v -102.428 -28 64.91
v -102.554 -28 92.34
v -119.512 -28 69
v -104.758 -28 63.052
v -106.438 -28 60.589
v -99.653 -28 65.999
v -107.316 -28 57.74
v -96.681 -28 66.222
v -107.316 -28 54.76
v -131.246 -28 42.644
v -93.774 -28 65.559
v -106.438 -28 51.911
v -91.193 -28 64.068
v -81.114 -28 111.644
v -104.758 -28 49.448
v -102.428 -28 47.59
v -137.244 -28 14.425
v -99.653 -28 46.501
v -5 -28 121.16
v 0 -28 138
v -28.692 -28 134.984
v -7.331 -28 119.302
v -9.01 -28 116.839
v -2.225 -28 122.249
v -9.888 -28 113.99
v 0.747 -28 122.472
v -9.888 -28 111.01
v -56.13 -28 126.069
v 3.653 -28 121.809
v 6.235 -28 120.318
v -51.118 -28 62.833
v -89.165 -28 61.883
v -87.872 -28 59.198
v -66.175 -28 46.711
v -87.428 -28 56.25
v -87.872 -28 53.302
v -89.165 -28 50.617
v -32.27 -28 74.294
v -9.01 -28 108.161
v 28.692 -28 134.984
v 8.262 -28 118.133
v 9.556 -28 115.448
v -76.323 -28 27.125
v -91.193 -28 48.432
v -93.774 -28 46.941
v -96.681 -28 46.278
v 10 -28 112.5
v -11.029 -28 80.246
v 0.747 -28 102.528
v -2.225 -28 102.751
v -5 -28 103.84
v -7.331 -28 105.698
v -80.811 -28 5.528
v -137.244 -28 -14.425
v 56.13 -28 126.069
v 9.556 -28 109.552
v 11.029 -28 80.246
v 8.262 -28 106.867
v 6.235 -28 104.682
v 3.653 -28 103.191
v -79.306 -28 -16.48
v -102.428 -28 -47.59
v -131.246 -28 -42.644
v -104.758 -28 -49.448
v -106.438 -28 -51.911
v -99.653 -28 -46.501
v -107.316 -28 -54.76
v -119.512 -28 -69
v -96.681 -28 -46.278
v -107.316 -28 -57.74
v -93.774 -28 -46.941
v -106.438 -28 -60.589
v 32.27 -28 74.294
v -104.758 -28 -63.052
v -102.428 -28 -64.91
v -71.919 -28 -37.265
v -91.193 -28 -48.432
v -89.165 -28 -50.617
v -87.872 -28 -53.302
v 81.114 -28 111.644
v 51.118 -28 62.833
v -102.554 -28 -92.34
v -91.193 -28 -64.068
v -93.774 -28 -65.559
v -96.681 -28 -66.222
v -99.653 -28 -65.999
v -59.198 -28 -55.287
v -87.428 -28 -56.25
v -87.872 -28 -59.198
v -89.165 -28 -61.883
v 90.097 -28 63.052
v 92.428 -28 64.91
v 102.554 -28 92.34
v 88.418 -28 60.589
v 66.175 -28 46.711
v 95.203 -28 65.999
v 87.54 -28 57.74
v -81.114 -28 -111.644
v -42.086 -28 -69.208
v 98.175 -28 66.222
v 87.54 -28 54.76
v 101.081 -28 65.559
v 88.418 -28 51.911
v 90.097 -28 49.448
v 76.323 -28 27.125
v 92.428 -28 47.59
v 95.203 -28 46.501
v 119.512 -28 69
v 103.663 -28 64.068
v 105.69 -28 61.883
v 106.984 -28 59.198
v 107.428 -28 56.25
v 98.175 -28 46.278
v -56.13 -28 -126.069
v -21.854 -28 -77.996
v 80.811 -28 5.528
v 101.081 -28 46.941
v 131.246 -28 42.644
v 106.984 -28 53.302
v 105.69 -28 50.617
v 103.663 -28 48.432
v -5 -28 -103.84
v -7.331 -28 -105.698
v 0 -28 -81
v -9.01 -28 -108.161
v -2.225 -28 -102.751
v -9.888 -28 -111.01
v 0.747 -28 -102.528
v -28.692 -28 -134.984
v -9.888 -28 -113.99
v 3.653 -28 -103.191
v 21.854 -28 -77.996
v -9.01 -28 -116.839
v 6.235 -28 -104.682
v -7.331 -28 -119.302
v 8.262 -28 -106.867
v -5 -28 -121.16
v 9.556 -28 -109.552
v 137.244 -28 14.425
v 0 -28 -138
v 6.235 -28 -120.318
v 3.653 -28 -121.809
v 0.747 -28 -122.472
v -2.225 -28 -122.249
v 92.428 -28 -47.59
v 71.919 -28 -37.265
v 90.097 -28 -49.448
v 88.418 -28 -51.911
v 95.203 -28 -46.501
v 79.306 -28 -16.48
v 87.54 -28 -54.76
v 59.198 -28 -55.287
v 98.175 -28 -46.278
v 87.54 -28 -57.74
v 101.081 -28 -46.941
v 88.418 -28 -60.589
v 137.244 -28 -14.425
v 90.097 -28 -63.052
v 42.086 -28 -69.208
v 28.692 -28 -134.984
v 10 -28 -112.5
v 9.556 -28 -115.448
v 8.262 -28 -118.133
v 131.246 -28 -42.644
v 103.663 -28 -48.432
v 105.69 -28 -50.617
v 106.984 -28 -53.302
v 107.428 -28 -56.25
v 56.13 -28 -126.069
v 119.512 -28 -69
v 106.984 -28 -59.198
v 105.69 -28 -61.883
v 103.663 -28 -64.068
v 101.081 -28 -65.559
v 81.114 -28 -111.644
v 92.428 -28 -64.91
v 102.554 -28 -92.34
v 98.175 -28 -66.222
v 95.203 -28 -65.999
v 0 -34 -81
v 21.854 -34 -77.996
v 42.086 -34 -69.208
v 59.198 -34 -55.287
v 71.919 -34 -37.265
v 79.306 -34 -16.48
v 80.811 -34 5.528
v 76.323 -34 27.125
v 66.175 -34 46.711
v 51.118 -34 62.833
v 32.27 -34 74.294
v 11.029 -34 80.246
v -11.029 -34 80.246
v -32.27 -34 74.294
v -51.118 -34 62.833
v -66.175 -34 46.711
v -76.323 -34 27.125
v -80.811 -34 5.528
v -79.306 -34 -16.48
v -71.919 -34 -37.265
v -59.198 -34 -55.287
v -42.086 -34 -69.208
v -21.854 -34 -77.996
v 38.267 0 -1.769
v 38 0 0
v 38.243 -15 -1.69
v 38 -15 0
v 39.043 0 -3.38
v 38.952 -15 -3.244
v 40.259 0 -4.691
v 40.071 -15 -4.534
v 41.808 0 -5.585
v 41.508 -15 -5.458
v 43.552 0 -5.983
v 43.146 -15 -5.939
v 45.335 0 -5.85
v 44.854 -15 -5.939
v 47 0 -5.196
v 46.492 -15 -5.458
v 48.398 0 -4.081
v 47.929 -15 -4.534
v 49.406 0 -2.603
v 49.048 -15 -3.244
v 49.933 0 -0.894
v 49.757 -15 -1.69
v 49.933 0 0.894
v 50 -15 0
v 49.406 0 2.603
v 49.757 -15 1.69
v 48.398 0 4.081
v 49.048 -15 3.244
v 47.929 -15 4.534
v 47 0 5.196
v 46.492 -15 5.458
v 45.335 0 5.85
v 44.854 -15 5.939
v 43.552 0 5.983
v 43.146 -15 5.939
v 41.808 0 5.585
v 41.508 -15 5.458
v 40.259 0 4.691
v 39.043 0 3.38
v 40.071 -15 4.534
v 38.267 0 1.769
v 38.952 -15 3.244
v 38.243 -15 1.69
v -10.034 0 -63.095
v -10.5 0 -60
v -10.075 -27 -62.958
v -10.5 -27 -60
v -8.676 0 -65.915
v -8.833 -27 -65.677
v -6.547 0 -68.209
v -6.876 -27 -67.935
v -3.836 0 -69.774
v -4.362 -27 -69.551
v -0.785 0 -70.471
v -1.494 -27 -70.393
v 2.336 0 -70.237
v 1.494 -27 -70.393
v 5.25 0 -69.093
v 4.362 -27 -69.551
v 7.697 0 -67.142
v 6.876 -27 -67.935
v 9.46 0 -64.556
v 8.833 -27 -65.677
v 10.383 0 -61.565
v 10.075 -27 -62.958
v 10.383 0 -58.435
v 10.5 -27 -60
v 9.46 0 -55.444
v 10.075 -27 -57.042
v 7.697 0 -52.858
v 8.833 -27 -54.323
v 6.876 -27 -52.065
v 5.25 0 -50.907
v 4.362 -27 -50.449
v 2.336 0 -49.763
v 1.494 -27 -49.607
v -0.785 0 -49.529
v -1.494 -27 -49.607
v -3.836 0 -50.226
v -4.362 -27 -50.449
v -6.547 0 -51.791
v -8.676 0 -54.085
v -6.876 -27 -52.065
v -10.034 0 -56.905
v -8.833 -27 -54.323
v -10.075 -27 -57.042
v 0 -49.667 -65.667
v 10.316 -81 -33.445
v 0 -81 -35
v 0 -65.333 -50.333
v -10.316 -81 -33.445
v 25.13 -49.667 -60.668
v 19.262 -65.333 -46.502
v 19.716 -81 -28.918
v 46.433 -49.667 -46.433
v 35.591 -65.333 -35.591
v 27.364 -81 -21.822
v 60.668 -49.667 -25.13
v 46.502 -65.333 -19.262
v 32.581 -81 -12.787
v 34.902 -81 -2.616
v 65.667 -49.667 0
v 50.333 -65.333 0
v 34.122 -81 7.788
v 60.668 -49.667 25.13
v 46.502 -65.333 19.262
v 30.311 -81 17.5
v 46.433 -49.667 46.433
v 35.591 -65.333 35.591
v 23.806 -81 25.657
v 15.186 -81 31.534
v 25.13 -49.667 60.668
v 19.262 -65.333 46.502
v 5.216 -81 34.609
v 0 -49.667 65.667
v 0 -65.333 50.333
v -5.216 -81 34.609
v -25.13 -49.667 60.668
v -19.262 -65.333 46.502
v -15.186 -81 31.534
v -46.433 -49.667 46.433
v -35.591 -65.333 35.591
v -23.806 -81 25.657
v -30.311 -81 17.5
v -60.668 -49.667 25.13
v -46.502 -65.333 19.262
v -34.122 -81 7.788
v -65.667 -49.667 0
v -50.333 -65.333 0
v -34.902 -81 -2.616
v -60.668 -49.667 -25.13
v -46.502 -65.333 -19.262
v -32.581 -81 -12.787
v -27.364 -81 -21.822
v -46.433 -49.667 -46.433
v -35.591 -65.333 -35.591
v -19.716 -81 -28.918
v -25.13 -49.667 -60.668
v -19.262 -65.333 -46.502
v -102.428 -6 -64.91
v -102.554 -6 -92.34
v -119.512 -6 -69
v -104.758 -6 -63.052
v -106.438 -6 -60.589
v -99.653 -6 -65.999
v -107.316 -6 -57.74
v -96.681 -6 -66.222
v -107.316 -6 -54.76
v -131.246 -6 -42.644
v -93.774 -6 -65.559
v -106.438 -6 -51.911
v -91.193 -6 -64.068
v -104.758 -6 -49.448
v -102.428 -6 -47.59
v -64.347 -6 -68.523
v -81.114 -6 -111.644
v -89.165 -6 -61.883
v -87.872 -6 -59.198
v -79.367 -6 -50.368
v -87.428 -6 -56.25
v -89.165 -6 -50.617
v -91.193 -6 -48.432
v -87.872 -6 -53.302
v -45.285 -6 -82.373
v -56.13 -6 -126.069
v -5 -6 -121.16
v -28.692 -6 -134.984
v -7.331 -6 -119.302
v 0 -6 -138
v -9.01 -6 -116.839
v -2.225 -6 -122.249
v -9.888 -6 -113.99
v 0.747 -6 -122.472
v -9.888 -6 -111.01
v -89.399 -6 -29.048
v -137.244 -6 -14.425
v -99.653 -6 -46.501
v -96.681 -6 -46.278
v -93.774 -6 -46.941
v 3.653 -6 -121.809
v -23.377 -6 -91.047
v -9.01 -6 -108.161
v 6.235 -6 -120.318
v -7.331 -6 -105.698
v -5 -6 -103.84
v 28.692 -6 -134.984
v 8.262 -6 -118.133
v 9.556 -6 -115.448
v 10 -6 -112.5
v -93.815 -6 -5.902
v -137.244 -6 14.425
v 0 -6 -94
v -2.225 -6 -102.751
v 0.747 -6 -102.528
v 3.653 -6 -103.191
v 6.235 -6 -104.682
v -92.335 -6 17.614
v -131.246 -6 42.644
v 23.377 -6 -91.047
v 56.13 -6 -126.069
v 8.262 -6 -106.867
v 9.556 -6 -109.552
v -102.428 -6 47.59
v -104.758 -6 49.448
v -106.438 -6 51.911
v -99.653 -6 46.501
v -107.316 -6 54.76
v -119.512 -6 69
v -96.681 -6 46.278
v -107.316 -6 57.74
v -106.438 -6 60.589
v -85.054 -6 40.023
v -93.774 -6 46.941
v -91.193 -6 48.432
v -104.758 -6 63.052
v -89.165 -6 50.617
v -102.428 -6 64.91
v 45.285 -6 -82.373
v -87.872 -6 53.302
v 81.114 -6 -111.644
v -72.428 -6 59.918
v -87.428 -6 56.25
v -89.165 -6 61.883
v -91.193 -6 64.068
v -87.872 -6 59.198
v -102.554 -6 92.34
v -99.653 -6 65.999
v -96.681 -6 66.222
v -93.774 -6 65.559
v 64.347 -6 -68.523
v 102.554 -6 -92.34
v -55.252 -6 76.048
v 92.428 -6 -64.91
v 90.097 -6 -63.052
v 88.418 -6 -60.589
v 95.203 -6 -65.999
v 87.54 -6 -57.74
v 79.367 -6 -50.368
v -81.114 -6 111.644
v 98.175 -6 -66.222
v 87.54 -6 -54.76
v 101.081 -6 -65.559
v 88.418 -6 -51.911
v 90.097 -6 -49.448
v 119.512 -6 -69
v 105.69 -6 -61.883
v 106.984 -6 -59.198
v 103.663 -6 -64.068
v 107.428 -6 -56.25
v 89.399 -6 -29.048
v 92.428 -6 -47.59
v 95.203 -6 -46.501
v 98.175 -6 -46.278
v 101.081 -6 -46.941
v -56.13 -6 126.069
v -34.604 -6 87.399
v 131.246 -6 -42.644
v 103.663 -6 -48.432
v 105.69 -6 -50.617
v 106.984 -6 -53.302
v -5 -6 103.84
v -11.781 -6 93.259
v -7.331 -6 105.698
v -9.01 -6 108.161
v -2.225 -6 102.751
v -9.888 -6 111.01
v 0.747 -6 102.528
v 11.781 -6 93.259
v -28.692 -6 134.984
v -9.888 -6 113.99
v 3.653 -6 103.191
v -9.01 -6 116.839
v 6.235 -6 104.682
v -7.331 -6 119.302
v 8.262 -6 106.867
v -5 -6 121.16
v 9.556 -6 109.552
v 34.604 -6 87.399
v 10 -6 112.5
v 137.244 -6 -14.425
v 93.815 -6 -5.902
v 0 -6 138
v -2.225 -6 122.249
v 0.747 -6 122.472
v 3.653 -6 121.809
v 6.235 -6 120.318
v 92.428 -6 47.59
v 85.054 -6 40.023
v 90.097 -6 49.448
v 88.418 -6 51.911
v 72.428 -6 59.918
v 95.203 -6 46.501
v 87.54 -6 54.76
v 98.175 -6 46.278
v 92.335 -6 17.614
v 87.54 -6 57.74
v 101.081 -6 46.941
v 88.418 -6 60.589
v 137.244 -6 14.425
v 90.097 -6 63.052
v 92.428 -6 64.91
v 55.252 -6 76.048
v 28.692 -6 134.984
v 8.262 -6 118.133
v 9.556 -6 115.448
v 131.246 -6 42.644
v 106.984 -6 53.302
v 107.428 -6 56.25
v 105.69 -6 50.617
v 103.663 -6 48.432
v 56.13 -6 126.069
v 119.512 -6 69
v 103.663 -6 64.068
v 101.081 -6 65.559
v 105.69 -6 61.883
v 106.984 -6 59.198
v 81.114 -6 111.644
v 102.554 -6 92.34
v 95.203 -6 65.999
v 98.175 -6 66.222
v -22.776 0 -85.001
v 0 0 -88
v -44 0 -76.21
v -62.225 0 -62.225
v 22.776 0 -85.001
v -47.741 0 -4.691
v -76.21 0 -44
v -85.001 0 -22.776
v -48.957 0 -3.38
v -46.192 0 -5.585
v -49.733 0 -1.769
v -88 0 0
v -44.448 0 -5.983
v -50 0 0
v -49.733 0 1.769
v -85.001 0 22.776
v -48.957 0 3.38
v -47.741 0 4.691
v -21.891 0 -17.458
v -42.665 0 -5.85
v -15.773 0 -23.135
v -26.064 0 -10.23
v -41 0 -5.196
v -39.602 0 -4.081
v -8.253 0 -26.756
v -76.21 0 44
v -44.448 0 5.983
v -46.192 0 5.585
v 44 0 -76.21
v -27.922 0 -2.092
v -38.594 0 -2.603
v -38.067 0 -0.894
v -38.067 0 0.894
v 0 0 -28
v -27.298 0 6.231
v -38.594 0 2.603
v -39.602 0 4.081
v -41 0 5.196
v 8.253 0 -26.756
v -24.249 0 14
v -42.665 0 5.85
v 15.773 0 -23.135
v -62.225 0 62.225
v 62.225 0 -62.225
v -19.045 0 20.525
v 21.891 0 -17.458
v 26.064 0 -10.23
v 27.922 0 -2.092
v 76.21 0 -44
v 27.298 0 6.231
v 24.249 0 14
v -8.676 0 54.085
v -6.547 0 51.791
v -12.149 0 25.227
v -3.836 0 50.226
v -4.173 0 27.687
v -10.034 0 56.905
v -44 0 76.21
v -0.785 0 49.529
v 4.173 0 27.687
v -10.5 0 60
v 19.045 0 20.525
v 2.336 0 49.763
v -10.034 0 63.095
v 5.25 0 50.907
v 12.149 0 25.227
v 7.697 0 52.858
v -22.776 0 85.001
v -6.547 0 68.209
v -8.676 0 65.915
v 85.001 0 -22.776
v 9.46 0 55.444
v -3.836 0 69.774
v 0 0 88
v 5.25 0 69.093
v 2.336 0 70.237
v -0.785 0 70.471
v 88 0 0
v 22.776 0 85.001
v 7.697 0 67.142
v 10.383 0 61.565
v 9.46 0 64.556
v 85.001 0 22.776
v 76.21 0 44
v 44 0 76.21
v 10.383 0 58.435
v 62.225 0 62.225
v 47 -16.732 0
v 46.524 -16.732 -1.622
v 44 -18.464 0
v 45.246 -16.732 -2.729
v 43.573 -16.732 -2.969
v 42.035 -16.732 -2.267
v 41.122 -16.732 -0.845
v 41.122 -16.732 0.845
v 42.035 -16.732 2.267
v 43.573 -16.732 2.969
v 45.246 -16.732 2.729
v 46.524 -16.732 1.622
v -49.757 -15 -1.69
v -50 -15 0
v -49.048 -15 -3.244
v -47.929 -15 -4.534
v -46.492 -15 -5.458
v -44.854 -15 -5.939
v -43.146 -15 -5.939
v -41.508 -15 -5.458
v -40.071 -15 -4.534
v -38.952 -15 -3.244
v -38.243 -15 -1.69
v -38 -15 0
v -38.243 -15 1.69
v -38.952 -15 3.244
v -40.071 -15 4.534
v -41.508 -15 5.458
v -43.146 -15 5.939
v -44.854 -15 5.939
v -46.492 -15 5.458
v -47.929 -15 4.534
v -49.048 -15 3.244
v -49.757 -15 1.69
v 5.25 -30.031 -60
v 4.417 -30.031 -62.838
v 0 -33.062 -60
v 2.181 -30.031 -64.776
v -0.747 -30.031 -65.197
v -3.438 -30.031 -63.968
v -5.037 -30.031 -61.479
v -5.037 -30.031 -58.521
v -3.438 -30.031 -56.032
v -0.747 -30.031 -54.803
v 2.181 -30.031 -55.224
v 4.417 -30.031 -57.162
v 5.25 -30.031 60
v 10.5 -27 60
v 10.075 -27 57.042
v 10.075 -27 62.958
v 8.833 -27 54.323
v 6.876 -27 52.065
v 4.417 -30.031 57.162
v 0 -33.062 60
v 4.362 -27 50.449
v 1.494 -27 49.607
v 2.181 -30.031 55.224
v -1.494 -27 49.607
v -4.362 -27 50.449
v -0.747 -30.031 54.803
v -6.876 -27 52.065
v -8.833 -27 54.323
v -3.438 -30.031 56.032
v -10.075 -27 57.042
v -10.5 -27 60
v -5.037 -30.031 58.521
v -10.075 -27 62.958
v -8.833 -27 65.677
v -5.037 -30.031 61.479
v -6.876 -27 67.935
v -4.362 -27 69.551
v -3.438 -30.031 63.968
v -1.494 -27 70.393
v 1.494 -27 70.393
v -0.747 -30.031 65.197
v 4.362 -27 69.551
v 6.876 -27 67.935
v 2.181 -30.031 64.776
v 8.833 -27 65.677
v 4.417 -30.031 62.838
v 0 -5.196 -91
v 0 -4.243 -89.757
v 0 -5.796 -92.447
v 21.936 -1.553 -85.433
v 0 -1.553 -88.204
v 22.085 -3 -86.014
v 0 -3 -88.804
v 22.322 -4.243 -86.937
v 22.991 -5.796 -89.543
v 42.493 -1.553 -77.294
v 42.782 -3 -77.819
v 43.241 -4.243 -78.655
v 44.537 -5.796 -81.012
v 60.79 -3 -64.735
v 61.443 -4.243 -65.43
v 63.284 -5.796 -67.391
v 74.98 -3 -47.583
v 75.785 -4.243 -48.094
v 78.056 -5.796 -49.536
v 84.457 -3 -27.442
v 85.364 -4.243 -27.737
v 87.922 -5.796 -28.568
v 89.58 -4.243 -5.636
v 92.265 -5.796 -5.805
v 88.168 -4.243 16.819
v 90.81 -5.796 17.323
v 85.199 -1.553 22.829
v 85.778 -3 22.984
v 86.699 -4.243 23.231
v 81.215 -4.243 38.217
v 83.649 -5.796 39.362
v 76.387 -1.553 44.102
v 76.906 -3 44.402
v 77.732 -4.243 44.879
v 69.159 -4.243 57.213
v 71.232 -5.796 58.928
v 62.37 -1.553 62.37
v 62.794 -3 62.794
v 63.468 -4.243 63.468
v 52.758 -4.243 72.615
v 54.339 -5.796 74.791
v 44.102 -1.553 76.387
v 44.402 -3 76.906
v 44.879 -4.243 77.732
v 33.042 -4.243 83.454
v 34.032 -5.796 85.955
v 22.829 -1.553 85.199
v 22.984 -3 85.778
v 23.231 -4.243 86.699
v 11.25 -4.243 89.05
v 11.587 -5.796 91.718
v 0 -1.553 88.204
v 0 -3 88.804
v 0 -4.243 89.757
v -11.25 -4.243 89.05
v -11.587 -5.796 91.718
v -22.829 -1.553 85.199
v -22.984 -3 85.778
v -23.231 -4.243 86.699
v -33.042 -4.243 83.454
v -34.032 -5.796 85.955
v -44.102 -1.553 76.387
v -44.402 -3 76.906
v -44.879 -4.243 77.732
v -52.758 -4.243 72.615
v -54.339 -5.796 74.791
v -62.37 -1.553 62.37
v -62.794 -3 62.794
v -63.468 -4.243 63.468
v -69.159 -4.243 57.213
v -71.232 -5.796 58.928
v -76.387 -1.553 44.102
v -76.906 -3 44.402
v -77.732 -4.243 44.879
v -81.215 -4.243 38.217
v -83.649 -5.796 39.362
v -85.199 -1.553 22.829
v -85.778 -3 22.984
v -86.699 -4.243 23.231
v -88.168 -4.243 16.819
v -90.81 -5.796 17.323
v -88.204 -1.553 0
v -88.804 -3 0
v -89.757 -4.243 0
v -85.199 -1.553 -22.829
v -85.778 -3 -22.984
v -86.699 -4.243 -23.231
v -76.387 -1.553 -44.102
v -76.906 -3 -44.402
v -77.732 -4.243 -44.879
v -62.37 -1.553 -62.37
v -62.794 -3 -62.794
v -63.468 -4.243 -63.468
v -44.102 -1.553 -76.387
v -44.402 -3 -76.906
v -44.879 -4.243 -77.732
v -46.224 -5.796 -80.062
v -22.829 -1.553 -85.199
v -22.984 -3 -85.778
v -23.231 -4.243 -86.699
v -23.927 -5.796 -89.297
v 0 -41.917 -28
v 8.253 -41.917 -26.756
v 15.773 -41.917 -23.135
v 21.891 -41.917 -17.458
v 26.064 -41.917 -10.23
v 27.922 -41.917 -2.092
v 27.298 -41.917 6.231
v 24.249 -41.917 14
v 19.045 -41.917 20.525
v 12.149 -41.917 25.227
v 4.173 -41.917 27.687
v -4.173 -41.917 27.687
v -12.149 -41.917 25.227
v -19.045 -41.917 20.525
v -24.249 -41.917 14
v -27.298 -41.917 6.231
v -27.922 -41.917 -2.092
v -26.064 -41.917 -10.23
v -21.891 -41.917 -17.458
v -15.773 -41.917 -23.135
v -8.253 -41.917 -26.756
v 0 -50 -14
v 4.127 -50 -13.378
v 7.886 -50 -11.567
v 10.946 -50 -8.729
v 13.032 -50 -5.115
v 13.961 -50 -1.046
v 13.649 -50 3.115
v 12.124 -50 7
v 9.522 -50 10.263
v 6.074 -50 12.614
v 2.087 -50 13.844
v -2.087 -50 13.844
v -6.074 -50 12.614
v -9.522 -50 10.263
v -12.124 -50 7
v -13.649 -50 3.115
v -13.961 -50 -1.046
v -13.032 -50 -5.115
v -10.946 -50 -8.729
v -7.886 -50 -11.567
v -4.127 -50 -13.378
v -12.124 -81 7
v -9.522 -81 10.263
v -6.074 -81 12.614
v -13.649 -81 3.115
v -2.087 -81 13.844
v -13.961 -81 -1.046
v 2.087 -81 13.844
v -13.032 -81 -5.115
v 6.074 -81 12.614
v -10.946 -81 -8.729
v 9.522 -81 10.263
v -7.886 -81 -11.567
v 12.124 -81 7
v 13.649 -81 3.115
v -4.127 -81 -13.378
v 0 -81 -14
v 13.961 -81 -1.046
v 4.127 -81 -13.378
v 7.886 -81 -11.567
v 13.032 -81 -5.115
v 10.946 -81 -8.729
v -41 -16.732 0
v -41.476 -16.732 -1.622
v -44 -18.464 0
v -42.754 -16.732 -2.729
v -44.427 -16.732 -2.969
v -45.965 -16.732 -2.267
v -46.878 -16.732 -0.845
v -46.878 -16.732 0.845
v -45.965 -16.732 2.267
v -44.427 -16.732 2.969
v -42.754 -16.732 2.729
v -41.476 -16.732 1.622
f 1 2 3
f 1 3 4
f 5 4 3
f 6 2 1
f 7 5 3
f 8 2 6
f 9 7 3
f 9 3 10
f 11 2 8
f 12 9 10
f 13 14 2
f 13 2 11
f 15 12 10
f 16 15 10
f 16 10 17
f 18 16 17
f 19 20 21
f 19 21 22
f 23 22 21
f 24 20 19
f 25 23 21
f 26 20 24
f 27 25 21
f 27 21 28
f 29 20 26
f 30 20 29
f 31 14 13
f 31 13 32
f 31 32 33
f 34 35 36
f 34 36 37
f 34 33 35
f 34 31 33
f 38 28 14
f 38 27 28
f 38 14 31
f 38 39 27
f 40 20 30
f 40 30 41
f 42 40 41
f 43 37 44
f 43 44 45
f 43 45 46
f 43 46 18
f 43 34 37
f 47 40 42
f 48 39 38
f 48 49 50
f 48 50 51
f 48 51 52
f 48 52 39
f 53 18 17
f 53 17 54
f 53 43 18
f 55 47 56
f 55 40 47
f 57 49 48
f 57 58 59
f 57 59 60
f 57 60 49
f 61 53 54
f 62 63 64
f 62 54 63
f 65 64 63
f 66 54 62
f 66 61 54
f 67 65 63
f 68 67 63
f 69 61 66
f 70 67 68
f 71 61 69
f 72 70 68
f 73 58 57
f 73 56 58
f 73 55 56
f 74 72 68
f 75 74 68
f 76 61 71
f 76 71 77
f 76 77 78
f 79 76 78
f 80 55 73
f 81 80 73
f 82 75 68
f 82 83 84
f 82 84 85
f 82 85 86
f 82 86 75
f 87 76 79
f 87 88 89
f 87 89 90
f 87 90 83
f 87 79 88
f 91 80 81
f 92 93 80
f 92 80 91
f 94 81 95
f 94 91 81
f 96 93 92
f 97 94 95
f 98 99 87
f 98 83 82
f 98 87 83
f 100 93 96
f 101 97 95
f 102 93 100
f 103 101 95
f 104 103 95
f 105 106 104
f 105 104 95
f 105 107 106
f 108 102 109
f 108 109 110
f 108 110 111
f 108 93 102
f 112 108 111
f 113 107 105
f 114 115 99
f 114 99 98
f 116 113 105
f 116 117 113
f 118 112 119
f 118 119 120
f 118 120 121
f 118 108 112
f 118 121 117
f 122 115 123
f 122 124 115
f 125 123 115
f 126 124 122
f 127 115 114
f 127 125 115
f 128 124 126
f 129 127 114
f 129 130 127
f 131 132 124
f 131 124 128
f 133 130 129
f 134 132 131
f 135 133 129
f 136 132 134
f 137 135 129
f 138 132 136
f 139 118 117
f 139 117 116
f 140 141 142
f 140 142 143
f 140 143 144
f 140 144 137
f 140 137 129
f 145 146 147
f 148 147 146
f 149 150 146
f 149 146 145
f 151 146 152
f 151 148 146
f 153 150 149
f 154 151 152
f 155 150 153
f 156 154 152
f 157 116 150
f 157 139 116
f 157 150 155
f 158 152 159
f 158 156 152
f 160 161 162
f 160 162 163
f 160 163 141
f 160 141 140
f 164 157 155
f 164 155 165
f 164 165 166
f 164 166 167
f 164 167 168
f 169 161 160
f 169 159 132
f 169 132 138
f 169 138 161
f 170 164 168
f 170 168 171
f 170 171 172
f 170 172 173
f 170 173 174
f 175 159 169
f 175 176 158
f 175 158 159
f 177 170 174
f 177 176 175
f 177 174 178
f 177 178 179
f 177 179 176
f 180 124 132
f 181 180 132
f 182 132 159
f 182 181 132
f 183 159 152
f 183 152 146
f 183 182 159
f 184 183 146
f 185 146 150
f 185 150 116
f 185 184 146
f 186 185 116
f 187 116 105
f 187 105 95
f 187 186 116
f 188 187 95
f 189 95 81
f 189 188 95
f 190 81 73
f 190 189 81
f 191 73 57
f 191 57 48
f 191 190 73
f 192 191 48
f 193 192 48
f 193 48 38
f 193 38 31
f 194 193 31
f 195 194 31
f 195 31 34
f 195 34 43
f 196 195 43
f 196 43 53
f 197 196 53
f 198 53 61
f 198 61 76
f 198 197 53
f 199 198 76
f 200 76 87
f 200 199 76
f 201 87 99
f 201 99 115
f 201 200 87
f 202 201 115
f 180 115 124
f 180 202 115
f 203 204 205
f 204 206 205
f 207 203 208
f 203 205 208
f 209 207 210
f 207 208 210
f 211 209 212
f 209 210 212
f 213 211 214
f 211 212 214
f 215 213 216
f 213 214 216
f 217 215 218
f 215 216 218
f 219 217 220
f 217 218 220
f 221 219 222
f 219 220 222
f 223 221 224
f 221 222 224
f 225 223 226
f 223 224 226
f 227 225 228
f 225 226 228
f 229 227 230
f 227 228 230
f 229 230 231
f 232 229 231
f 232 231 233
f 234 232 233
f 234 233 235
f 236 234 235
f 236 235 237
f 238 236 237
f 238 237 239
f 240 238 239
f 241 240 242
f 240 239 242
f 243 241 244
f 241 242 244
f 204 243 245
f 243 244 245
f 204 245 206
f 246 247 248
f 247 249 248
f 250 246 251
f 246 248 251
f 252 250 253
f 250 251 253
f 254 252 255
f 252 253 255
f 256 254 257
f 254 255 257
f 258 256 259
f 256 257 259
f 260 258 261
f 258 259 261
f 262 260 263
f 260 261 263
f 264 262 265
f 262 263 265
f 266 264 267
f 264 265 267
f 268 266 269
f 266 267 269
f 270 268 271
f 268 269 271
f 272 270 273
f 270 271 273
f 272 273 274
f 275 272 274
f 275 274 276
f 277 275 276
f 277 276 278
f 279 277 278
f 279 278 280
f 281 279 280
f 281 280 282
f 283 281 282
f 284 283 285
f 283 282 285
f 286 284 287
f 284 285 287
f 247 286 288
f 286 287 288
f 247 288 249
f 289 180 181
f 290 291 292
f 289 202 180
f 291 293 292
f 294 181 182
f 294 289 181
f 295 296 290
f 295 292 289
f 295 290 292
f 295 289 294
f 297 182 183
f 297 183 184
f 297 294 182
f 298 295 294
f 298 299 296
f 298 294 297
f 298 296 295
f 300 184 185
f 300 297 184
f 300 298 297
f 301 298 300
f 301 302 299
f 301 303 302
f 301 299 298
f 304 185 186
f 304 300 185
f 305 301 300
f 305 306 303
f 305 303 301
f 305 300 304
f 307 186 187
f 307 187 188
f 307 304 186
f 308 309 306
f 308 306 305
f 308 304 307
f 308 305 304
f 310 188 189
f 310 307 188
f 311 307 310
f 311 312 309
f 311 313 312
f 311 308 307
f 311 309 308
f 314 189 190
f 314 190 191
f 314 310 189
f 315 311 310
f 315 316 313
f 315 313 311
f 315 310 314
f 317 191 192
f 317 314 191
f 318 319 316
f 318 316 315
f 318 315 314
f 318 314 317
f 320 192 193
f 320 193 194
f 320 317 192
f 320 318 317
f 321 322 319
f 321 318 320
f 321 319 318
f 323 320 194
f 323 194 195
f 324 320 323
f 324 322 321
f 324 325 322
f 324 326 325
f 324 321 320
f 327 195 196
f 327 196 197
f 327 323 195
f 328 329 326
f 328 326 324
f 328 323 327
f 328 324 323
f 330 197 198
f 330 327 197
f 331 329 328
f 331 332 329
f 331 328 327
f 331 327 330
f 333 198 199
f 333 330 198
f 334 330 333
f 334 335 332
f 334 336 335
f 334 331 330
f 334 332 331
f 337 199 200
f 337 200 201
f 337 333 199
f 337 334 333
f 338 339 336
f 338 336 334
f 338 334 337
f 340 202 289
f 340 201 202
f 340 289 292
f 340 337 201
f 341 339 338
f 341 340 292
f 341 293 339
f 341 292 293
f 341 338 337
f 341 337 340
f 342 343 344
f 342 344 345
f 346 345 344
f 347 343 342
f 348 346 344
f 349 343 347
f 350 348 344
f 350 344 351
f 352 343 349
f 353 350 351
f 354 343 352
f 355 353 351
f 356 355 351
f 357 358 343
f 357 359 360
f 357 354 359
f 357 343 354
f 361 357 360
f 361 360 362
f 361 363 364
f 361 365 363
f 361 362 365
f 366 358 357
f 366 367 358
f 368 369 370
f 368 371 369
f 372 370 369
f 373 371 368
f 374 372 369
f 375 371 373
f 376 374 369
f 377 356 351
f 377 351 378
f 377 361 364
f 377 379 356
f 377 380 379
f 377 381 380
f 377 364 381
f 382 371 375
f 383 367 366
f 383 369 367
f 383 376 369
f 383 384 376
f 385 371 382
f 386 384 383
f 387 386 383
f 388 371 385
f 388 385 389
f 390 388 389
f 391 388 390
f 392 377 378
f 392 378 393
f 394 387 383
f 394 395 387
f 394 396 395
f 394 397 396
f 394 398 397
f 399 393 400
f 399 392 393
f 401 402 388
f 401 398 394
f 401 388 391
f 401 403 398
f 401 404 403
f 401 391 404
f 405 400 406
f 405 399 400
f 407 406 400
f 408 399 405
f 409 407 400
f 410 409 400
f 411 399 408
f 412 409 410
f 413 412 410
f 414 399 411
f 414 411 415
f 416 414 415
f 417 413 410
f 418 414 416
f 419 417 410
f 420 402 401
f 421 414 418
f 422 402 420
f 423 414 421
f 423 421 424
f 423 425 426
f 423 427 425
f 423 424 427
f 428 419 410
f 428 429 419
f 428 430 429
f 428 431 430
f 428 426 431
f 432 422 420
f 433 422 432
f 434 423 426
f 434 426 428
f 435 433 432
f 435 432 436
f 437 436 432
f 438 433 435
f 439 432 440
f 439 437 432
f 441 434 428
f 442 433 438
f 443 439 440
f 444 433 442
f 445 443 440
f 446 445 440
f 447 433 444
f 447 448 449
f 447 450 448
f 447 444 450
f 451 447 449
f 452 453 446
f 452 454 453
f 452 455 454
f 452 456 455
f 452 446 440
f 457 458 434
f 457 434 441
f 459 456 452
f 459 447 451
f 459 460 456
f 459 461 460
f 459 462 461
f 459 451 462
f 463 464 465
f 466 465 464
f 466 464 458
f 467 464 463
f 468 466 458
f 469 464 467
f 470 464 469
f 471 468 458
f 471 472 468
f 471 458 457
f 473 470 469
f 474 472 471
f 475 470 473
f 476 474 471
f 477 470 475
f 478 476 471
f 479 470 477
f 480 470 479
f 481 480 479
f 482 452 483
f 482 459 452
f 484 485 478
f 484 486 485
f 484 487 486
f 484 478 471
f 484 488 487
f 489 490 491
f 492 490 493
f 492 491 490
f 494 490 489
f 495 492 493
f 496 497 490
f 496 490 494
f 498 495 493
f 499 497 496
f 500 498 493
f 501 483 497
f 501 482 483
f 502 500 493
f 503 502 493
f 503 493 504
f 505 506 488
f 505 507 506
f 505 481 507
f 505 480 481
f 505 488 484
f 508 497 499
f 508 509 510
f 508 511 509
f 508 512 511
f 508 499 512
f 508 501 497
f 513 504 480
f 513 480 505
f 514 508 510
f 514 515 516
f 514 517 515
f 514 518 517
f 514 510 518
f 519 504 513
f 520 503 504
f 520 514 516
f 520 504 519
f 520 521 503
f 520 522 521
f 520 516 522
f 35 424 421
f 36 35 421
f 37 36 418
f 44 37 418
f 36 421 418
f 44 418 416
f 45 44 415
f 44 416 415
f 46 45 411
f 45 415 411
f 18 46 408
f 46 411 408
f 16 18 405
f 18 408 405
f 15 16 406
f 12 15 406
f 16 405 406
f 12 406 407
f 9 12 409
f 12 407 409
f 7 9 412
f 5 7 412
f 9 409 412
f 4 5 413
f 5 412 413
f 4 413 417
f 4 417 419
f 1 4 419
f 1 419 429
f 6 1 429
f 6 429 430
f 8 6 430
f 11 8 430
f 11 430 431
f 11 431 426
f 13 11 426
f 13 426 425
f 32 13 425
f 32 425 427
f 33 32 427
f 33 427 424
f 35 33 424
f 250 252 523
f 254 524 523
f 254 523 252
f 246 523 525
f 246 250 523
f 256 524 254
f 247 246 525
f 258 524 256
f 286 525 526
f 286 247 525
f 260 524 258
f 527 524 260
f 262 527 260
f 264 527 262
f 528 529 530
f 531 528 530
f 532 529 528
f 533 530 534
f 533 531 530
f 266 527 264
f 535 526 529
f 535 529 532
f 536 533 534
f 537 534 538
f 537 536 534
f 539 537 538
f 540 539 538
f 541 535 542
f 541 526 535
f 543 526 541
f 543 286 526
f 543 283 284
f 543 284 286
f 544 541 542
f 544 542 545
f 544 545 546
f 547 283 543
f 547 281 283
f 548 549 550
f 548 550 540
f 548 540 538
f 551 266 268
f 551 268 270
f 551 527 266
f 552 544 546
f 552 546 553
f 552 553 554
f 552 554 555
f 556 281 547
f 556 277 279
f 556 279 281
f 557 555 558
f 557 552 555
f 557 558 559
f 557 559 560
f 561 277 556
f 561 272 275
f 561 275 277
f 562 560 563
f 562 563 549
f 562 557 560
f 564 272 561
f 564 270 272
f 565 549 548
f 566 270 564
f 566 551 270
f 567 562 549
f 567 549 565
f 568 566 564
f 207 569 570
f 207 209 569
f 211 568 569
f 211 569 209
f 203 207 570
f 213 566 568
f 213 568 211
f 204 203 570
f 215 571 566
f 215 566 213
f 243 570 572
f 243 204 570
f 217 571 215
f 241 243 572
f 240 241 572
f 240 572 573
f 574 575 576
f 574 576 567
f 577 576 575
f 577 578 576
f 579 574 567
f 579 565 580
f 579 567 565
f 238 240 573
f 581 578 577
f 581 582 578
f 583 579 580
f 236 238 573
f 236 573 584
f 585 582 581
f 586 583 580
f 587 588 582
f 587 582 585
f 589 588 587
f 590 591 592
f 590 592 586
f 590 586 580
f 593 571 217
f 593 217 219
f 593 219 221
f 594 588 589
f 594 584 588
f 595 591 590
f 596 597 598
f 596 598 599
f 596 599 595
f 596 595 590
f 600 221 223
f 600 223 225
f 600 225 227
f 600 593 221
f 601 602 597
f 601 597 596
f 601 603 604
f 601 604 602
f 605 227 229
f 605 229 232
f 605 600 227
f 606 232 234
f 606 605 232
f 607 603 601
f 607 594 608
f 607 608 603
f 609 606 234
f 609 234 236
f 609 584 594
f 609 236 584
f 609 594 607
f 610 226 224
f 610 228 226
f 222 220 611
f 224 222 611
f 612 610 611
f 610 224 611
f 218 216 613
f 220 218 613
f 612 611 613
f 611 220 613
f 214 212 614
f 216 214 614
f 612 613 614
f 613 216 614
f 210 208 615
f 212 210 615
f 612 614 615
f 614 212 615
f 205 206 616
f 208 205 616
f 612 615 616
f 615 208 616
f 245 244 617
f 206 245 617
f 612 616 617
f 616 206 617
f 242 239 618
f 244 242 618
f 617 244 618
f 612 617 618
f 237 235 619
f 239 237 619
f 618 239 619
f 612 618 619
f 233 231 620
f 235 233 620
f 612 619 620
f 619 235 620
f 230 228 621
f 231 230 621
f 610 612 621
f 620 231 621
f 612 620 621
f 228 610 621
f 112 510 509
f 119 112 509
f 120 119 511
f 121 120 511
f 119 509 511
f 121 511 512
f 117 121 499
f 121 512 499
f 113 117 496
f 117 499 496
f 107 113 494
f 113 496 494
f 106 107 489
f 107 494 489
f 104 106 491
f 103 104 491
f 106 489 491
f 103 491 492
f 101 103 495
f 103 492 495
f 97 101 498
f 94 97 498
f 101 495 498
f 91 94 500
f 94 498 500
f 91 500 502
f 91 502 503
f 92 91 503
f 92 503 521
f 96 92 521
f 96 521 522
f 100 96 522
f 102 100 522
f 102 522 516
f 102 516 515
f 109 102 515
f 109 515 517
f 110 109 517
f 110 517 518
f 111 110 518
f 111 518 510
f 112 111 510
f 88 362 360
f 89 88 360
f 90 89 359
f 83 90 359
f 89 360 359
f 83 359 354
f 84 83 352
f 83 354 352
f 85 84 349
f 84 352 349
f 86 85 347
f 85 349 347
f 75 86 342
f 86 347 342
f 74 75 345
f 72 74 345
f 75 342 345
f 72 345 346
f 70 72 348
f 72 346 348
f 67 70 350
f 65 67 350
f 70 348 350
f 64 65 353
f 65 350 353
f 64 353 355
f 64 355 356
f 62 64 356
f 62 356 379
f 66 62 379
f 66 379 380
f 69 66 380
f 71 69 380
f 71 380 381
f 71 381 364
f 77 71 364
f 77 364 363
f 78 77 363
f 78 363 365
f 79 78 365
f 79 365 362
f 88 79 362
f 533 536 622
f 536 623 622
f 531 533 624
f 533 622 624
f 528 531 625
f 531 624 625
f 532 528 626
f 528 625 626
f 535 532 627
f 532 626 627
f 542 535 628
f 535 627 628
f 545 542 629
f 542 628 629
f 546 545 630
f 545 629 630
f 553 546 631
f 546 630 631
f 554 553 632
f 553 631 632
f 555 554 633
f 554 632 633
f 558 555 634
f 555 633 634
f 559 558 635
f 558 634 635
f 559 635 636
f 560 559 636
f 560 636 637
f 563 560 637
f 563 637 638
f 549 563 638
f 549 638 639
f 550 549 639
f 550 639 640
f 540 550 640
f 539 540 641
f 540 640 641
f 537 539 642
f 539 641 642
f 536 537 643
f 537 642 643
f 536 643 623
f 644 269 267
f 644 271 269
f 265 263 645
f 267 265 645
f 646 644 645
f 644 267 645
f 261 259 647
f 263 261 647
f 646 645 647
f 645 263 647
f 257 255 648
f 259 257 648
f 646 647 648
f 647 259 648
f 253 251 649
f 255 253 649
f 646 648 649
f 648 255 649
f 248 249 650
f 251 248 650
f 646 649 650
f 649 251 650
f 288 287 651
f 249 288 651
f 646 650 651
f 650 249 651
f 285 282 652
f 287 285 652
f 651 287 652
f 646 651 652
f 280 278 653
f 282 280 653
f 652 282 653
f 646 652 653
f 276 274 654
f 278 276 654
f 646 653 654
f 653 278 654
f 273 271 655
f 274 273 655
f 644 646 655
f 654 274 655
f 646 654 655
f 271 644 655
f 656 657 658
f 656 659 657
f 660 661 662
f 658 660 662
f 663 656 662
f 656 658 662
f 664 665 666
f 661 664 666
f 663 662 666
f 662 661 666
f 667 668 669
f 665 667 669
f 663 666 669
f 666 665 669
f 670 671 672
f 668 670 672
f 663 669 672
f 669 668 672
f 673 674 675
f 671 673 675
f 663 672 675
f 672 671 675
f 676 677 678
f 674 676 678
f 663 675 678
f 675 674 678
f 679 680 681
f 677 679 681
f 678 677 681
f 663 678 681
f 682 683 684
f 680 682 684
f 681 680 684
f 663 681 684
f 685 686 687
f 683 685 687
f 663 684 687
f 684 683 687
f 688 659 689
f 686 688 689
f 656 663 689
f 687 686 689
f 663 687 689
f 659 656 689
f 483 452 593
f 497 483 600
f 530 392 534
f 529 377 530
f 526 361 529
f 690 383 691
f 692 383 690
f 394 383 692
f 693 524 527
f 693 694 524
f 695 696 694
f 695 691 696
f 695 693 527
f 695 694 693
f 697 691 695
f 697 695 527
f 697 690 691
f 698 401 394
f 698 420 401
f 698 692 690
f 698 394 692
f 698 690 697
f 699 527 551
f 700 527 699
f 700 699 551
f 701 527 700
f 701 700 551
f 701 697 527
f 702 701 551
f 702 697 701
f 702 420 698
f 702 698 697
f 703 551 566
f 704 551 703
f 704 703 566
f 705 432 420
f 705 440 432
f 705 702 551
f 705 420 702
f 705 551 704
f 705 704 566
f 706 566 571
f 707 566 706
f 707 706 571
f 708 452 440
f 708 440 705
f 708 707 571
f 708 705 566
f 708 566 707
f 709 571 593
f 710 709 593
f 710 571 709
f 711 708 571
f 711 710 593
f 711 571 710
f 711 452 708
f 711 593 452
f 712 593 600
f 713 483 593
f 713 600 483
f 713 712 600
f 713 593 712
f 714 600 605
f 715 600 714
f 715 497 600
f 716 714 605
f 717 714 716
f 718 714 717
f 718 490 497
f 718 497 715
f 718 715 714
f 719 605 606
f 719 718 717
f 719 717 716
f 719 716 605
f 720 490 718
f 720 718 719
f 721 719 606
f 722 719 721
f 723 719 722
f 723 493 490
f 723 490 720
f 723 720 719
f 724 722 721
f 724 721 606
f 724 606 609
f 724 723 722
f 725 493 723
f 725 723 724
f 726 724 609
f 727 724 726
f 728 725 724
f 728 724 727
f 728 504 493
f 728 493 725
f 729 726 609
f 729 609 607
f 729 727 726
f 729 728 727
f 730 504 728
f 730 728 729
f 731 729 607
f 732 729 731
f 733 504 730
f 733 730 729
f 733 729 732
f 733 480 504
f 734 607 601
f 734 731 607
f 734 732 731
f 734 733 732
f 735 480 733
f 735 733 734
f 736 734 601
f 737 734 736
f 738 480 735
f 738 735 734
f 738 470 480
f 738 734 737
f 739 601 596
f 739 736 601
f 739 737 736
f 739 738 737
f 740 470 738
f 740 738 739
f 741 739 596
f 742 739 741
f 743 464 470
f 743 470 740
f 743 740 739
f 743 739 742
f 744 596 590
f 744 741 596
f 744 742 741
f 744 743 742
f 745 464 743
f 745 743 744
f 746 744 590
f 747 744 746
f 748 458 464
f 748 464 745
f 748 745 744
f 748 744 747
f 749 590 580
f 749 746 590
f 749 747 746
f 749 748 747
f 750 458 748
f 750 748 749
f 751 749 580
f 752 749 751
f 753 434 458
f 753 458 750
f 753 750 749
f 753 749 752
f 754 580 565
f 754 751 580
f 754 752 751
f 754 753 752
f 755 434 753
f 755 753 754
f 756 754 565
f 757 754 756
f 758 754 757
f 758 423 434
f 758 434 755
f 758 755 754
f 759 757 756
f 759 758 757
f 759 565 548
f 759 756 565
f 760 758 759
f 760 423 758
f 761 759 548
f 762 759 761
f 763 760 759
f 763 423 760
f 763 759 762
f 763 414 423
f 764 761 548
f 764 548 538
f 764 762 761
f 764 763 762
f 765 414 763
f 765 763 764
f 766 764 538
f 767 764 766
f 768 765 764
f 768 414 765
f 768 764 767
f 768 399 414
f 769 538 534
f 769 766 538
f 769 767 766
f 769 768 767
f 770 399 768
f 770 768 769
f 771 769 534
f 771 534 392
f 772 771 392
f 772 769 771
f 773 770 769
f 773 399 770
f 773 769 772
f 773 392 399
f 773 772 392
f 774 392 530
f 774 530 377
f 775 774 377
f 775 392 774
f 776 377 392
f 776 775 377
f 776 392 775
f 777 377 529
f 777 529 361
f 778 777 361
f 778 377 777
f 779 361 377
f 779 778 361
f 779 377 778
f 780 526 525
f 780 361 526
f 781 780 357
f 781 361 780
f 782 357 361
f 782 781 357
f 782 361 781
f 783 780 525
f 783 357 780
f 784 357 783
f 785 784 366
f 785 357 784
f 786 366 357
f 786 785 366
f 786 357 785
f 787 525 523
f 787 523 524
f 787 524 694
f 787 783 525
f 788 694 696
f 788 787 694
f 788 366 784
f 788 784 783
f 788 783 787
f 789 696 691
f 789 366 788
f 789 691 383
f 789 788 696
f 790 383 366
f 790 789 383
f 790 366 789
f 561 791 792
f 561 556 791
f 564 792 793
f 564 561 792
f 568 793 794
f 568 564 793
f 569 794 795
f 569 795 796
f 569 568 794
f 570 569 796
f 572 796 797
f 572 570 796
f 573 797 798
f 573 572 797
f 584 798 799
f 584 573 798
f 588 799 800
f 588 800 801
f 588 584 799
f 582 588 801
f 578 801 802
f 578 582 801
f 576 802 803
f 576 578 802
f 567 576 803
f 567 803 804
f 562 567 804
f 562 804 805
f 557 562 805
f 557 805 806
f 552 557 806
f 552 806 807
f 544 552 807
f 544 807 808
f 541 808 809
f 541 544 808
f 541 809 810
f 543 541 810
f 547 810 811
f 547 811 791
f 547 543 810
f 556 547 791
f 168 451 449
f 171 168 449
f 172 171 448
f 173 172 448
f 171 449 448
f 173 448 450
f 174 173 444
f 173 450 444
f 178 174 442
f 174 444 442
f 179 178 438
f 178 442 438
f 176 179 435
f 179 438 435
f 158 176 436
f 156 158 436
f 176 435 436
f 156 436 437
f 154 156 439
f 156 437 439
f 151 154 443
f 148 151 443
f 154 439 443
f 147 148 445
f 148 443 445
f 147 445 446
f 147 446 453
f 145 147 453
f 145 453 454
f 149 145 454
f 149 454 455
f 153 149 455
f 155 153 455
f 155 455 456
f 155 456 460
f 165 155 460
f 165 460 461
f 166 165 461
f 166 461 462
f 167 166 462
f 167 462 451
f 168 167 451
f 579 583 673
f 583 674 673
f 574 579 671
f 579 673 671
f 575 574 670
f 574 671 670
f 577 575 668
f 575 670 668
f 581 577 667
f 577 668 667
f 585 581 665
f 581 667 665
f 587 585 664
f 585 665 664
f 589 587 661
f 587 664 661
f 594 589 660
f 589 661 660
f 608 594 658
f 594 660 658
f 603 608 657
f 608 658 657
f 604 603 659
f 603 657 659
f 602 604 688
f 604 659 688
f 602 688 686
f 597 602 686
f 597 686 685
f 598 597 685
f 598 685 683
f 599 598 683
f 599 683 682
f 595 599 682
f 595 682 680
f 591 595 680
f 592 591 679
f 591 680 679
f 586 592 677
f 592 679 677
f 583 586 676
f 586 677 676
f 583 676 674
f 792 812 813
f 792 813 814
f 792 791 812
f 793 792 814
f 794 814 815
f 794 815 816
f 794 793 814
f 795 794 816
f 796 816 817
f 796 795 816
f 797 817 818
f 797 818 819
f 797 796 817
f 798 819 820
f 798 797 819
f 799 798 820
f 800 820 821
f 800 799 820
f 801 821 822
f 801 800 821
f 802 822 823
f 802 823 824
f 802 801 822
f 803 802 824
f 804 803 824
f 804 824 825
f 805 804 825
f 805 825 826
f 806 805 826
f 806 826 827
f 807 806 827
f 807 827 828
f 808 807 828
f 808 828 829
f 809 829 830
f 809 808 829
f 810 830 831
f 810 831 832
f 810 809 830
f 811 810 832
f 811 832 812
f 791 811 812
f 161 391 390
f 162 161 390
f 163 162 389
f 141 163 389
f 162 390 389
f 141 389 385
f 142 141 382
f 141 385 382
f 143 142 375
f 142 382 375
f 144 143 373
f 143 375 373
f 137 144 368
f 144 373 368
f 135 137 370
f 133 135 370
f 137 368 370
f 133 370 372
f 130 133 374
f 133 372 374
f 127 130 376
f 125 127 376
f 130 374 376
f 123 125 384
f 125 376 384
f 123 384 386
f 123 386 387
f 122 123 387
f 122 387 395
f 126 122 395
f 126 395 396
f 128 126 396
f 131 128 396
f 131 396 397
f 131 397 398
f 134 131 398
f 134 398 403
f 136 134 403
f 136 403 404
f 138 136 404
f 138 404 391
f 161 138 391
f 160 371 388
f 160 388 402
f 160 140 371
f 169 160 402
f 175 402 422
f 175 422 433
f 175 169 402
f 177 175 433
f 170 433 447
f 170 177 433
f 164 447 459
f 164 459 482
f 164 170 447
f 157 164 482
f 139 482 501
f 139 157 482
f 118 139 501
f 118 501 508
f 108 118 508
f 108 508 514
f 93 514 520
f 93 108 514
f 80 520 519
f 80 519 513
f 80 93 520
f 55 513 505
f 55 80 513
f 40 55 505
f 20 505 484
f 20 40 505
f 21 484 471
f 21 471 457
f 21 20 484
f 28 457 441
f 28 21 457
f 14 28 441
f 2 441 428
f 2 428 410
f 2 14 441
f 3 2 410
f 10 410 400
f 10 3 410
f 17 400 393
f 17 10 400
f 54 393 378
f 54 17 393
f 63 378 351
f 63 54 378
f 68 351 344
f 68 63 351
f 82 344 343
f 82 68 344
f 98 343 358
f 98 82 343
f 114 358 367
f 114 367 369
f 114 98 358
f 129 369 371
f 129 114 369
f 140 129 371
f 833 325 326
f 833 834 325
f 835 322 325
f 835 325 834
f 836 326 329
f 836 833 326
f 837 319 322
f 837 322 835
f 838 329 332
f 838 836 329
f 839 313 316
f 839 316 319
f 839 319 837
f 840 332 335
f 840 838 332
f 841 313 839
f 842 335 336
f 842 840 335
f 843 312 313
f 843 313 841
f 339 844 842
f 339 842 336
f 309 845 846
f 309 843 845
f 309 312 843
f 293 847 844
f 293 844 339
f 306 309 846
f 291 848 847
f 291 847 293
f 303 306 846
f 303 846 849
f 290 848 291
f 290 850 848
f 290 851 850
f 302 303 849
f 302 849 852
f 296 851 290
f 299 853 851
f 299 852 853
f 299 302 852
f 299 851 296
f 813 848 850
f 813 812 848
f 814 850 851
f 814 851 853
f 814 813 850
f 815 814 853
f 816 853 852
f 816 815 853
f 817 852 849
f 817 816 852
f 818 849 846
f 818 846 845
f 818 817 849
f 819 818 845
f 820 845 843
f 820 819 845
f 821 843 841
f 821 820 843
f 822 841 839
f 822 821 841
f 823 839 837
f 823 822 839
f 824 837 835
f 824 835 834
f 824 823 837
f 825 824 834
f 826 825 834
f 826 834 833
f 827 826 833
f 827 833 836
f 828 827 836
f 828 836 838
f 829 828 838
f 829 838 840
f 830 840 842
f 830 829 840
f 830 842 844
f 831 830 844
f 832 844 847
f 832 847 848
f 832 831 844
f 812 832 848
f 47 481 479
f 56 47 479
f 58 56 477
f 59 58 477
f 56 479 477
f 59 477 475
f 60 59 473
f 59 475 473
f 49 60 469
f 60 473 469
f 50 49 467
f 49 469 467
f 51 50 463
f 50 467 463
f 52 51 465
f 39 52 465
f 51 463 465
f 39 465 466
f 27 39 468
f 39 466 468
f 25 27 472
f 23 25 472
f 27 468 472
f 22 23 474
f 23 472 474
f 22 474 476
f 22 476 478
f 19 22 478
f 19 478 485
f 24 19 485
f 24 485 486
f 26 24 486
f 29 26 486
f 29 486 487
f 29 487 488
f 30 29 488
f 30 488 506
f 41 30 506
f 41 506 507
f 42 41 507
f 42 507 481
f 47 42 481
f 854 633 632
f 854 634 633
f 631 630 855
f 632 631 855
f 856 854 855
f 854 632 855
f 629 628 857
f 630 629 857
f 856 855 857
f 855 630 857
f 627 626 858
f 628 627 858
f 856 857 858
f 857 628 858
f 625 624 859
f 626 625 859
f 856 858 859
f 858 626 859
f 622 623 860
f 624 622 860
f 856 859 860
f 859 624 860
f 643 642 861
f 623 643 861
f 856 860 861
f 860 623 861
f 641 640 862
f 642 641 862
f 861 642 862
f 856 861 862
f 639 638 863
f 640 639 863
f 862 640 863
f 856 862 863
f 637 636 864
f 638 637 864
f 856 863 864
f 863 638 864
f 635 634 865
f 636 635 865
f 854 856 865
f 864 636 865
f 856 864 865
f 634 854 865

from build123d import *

# Parameters (mm, degrees)
SKETCH4_R              = 10
CUT_EXTRUDE1_DEPTH     = 76
M24_TAPPED_HOLE1_D     = 21
M24_TAPPED_HOLE1_DEPTH = 27
M24_TAPPED_HOLE1_TIP   = 6.062177826
M12_TAPPED_HOLE1_D     = 12
M12_TAPPED_HOLE1_DEPTH = 15
M12_TAPPED_HOLE1_TIP   = 3.464101615


with BuildPart() as part:
    # Sketch2 → Revolve1 (revolve)
    with BuildSketch(Plane(origin=(0, 0, 0), x_dir=(0, 0, -1), z_dir=(1, 0, 0))):
        with BuildLine():
            Line((28, 0), (88, 0))
            ThreePointArc((88, 0), (89.757359313, -4.242640687), (94, -6))
            Line((94, -6), (138, -6))
            Line((138, -6), (138, -28))
            Line((138, -28), (81, -28))
            Line((81, -28), (81, -34))
            Line((81, -34), (35, -81))
            Line((35, -81), (14, -81))
            Line((14, -81), (14, -50))
            Line((14, -50), (28, -41.917096231))
            Line((28, -41.917096231), (28, 0))
        make_face()
    revolve(axis=Axis((0, 70.454304255, 0), (0, -1, 0)))

    # Sketch4 → Cut-Extrude1 (cut, through all)
    with BuildSketch(Plane(origin=(0, -6, 0), x_dir=(1, 0, 0), z_dir=(0, 1, 0))):
        with Locations((0, 112.5)):
            Circle(SKETCH4_R)
        with Locations((97.427857926, 56.25)):
            Circle(SKETCH4_R)
        with Locations((97.427857926, -56.25)):
            Circle(SKETCH4_R)
        with Locations((0, -112.5)):
            Circle(SKETCH4_R)
        with Locations((-97.427857926, -56.25)):
            Circle(SKETCH4_R)
        with Locations((-97.427857926, 56.25)):
            Circle(SKETCH4_R)
    extrude(amount=-CUT_EXTRUDE1_DEPTH, mode=Mode.SUBTRACT)

    # M24 Tapped Hole1
    with Locations(Plane(origin=(0, 0, 0), x_dir=(1, 0, 0), z_dir=(0, 1, 0))):
        with Locations((0, -60), (0, 60)):
            Hole(M24_TAPPED_HOLE1_D / 2, depth=M24_TAPPED_HOLE1_DEPTH)
            with Locations((0, 0, -(M24_TAPPED_HOLE1_DEPTH + M24_TAPPED_HOLE1_TIP / 2))):  # 120° drill point
                Cone(0, M24_TAPPED_HOLE1_D / 2, M24_TAPPED_HOLE1_TIP, mode=Mode.SUBTRACT)

    # M12 Tapped Hole1
    with Locations(Plane(origin=(0, 0, 0), x_dir=(1, 0, 0), z_dir=(0, 1, 0))):
        with Locations((-44, 0), (44, 0)):
            Hole(M12_TAPPED_HOLE1_D / 2, depth=M12_TAPPED_HOLE1_DEPTH)
            with Locations((0, 0, -(M12_TAPPED_HOLE1_DEPTH + M12_TAPPED_HOLE1_TIP / 2))):  # 120° drill point
                Cone(0, M12_TAPPED_HOLE1_D / 2, M12_TAPPED_HOLE1_TIP, mode=Mode.SUBTRACT)


solid = part.part
